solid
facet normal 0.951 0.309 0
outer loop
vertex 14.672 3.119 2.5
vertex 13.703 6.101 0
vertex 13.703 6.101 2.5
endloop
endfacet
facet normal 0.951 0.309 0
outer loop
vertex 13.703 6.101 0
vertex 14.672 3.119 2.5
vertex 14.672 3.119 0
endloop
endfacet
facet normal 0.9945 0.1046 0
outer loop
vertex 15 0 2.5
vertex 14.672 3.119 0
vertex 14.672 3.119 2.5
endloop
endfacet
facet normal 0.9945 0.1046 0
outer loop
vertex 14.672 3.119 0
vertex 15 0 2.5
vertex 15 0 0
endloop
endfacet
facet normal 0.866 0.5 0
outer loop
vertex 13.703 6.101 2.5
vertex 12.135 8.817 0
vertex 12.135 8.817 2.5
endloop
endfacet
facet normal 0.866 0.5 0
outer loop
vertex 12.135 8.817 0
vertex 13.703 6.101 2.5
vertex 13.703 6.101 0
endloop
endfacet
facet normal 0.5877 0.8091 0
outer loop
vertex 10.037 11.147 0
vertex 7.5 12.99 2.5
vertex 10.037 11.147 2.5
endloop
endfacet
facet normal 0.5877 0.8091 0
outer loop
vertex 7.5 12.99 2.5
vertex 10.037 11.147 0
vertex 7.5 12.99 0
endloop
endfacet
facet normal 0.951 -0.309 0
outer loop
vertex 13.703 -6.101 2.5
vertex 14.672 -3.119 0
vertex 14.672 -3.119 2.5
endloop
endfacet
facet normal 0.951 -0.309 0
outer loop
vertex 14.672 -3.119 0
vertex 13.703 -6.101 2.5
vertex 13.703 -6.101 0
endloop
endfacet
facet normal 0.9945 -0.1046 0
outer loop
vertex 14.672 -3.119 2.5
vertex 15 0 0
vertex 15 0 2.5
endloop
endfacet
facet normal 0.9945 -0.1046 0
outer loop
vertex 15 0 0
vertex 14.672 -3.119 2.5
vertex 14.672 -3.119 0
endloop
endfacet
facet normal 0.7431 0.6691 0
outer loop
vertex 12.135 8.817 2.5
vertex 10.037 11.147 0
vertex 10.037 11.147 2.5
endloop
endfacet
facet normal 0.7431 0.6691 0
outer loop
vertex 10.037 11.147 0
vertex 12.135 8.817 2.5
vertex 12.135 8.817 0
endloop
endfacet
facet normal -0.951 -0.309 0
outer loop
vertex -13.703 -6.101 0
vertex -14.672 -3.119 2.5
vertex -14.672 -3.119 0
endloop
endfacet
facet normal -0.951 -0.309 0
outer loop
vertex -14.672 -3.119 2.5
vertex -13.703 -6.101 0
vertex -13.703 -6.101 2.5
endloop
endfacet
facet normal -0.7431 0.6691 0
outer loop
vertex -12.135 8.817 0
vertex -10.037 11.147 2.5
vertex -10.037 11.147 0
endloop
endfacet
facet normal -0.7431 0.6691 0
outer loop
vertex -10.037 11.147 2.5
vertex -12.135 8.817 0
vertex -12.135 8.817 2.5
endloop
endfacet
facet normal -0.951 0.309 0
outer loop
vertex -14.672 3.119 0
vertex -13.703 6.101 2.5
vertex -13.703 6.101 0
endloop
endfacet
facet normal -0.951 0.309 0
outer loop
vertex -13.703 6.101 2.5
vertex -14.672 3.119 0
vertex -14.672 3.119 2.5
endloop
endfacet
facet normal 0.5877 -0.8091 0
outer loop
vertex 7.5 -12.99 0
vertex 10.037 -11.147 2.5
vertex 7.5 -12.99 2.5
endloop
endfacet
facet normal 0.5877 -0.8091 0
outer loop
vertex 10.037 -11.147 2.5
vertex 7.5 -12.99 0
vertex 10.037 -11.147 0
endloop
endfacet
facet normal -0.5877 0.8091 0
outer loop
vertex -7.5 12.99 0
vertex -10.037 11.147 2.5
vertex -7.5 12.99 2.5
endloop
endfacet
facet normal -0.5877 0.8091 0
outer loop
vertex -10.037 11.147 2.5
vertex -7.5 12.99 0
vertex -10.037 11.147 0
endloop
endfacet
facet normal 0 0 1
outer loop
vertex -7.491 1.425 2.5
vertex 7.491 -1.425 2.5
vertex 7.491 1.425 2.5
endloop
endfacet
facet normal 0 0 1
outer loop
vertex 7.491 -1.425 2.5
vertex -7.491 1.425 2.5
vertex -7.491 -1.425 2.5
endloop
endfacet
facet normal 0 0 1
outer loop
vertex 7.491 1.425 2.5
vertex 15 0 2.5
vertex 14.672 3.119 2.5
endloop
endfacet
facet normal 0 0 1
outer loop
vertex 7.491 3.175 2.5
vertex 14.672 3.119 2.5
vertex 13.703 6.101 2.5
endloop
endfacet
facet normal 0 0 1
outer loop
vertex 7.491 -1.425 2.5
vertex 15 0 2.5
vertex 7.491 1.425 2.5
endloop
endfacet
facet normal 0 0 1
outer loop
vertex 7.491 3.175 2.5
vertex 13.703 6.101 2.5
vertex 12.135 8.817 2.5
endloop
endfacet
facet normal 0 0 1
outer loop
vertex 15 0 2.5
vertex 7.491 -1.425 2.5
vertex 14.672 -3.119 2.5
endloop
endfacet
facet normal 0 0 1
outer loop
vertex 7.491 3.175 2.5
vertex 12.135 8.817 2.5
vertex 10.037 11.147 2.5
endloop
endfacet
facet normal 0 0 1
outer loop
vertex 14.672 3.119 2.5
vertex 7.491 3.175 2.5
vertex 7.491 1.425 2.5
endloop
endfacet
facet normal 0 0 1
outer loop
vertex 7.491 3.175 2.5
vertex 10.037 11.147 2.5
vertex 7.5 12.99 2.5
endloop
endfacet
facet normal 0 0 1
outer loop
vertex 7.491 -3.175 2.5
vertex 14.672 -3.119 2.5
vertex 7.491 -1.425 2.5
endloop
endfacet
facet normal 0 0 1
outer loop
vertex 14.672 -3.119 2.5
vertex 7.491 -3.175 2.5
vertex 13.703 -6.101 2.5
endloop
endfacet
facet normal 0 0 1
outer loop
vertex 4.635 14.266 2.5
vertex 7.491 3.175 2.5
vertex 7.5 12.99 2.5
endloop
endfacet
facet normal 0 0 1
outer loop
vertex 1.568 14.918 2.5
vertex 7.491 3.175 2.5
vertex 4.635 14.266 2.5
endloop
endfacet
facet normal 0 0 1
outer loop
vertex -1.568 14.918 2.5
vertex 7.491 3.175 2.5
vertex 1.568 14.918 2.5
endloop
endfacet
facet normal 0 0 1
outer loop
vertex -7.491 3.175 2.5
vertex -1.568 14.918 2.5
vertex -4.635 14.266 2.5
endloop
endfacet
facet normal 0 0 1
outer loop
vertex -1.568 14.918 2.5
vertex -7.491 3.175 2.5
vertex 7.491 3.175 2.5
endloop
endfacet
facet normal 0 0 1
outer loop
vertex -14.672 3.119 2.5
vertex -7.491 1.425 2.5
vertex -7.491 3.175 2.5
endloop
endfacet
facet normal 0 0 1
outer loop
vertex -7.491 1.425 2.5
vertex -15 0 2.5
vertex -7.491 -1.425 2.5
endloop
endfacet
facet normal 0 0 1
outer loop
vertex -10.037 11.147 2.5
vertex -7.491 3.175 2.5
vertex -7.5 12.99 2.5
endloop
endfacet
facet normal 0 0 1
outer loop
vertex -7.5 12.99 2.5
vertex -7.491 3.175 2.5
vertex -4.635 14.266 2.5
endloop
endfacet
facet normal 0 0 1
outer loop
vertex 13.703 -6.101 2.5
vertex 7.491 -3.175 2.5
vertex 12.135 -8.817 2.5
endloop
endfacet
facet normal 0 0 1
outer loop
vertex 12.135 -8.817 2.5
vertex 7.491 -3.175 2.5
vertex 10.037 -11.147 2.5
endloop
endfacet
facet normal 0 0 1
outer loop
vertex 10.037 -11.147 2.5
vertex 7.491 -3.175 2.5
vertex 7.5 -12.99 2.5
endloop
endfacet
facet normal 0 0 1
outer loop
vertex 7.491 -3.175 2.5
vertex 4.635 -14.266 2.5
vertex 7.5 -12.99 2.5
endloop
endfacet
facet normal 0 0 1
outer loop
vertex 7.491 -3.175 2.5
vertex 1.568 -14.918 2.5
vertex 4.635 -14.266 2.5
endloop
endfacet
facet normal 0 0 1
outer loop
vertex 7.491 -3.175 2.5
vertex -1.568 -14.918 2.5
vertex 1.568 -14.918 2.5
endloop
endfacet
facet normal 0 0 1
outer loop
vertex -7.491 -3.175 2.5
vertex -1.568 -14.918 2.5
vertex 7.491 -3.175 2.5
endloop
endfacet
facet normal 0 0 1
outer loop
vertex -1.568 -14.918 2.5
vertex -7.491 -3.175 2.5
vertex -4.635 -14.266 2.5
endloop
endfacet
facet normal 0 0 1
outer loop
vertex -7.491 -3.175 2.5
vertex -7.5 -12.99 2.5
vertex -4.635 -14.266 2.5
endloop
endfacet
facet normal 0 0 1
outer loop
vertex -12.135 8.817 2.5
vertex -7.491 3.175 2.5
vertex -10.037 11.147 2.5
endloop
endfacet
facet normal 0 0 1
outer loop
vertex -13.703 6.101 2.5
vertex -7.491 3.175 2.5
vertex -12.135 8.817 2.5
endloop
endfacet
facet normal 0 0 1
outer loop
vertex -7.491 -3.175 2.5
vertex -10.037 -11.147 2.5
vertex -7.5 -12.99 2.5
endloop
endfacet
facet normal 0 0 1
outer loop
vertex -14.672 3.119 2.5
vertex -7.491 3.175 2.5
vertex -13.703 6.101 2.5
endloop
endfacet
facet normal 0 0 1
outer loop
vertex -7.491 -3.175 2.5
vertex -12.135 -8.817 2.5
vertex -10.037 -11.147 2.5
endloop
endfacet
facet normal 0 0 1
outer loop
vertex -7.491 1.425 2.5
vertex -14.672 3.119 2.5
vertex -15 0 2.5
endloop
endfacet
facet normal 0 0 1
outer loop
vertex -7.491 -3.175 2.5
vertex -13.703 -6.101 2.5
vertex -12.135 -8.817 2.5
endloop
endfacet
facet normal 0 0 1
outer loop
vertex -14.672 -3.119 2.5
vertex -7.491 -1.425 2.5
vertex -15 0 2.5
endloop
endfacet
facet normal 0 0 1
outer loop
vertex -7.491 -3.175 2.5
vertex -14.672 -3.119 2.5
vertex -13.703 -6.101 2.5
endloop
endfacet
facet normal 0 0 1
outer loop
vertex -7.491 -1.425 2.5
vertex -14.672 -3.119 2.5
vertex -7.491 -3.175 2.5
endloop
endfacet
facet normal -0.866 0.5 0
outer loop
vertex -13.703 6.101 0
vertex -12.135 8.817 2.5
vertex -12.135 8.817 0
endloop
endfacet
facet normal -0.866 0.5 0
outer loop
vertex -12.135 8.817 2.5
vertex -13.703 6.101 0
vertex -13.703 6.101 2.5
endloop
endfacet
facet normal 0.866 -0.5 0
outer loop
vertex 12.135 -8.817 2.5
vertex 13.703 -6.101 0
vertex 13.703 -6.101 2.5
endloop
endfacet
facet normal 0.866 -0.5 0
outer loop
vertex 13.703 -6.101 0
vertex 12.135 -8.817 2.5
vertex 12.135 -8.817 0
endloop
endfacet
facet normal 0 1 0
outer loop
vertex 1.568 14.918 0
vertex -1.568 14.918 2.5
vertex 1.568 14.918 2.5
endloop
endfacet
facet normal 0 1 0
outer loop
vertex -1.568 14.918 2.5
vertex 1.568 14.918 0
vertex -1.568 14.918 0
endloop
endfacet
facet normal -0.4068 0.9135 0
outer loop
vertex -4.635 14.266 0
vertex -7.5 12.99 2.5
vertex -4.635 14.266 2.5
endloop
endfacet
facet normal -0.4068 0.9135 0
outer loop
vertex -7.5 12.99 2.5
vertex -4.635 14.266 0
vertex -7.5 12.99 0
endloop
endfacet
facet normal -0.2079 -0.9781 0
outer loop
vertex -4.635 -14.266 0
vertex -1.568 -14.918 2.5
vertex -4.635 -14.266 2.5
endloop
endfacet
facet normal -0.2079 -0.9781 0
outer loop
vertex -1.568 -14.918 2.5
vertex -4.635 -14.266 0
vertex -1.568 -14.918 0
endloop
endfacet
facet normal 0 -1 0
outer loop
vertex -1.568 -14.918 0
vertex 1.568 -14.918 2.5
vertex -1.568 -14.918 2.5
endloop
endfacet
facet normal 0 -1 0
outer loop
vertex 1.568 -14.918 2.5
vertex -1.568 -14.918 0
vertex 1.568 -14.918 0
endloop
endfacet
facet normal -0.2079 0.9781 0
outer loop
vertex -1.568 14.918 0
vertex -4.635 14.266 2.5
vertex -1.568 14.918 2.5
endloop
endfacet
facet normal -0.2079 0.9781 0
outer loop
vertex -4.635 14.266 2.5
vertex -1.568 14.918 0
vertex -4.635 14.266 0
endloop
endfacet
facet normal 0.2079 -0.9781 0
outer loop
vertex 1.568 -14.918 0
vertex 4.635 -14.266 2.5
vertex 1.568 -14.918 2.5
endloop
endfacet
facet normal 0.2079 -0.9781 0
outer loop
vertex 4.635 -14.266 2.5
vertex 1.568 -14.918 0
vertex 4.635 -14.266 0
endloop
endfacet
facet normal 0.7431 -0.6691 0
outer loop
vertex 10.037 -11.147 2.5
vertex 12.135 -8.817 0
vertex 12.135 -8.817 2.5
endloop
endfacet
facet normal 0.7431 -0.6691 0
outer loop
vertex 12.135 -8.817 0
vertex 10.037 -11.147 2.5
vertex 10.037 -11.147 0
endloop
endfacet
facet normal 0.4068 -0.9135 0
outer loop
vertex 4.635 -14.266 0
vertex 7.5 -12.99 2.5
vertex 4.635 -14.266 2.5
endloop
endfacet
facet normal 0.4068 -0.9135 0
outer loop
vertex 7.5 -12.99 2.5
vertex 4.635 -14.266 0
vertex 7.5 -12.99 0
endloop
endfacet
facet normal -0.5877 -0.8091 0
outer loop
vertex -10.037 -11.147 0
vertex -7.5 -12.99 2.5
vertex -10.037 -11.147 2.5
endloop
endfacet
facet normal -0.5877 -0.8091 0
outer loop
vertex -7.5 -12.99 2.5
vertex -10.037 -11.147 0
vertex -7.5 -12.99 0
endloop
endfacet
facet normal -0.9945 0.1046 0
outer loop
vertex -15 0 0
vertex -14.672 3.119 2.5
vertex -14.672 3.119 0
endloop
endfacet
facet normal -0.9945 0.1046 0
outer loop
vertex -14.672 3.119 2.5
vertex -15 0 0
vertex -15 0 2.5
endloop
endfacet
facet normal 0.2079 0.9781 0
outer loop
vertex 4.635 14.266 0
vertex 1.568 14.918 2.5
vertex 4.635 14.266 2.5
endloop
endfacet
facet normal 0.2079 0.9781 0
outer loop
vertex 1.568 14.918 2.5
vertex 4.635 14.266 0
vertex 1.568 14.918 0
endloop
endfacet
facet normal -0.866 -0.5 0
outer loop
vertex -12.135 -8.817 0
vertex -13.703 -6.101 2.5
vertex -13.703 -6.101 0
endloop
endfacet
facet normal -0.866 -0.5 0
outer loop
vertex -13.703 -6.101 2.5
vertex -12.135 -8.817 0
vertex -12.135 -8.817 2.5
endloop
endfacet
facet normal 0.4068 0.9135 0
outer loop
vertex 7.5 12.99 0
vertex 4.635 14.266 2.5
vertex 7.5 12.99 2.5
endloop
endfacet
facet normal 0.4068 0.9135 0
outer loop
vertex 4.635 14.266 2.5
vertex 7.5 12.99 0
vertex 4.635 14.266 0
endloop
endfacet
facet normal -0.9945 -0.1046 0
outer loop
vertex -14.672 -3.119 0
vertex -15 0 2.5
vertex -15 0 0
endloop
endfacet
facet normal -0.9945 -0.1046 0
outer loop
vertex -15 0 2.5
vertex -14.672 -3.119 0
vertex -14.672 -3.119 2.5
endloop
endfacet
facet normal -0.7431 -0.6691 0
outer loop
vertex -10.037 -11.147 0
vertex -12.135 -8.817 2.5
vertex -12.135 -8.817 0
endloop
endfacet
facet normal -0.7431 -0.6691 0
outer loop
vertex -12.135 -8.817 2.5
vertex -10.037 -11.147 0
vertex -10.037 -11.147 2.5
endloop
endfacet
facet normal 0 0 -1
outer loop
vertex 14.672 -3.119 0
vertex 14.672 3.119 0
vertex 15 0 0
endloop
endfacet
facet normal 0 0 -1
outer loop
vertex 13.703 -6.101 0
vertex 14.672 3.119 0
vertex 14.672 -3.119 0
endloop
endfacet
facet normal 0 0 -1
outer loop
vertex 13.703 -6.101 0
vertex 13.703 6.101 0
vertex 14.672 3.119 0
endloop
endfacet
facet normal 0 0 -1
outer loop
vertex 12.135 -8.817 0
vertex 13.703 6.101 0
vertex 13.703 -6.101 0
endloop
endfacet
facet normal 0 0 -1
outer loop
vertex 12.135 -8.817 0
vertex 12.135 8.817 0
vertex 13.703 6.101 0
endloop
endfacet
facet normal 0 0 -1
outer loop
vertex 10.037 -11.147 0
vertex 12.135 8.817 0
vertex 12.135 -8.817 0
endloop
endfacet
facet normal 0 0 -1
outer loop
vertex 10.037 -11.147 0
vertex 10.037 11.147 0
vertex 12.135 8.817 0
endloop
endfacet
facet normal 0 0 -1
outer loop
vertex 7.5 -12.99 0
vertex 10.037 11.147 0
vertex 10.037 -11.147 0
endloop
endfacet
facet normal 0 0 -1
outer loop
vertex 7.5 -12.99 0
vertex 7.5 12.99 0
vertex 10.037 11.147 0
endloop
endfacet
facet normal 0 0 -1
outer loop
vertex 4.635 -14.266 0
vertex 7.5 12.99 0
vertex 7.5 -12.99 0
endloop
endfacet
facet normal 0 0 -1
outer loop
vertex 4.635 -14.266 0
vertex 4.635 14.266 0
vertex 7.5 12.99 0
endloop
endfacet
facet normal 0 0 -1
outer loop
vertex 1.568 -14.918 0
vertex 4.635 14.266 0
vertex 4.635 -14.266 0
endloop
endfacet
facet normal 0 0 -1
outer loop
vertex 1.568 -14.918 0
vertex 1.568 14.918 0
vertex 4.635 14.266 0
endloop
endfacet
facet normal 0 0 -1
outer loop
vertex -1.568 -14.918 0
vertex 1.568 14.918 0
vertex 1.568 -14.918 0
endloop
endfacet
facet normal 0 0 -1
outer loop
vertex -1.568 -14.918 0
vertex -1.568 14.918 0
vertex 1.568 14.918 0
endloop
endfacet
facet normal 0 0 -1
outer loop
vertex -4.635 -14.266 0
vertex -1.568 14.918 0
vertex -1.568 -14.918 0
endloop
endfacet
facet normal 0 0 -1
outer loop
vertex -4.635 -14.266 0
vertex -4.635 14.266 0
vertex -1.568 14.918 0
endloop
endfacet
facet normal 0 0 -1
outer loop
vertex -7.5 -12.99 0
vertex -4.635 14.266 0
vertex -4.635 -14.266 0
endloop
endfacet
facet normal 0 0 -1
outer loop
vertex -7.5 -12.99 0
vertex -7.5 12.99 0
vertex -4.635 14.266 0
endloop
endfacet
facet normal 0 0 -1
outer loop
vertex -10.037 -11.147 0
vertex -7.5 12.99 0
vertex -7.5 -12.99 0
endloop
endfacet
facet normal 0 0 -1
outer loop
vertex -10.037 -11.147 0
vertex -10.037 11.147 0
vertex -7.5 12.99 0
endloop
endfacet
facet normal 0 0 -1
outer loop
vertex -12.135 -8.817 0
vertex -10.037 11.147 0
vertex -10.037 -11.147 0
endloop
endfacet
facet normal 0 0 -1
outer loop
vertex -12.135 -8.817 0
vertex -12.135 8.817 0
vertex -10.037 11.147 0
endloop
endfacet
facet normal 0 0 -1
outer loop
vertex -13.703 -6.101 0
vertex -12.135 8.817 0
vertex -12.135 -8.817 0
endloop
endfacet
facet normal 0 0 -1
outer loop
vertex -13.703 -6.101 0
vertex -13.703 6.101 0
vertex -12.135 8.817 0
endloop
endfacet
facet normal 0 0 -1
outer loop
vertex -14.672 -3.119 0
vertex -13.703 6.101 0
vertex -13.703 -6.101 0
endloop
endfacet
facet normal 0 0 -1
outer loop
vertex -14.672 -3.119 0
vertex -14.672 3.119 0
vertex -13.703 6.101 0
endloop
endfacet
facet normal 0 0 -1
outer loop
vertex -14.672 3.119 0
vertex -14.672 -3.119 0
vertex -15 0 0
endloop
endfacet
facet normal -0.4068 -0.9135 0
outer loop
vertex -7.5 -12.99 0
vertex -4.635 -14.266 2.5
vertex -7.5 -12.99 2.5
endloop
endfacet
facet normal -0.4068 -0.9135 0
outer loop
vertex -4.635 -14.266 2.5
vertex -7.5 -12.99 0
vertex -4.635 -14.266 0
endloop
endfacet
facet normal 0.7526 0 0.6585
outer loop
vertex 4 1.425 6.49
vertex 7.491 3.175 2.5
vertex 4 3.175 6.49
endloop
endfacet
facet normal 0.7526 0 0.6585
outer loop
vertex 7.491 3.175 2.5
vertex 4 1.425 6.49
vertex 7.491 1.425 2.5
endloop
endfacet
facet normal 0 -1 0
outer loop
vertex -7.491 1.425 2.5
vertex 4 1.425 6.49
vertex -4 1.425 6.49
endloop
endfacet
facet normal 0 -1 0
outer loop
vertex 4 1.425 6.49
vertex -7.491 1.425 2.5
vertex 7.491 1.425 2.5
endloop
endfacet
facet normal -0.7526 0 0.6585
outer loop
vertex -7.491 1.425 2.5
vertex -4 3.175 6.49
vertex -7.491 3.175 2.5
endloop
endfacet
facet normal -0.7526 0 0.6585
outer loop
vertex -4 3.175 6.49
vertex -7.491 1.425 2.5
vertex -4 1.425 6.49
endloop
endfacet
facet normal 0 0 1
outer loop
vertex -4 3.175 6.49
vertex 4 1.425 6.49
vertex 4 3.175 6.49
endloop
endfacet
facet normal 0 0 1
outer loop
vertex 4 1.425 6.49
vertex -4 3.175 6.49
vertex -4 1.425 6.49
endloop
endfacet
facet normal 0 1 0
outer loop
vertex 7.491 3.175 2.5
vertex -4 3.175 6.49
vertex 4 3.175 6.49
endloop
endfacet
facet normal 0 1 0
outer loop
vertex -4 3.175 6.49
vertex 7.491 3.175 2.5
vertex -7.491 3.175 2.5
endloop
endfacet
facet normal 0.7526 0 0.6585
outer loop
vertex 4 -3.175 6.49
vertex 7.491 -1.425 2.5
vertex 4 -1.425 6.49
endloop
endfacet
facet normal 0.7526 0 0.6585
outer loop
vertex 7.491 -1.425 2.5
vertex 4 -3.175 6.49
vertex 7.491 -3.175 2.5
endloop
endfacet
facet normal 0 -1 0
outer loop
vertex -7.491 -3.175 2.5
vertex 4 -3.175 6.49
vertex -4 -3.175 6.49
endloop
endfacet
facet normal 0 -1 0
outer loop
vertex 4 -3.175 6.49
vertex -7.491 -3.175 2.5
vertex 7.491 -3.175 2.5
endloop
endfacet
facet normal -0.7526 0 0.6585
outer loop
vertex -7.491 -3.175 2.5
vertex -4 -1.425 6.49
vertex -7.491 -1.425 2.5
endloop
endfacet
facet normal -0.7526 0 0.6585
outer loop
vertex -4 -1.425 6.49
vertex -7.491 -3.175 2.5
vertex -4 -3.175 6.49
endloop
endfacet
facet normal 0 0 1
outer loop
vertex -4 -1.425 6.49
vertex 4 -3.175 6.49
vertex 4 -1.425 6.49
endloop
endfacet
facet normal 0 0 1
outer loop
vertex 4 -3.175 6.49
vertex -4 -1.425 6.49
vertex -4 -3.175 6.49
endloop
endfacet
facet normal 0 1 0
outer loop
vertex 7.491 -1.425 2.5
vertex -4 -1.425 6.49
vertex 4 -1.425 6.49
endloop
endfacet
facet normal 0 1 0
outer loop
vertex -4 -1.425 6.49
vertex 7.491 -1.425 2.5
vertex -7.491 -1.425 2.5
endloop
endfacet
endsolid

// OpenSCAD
baseDiameter = 30;
baseThickness = 2.5;
holderThickness = 1.75;
holderHeight = 4;
holderSpacing = 2.85;
holderWidth = 15;
holderWidth2 = 8;

cylinder(d=baseDiameter,h=baseThickness);
module holder() {
    translate([0,holderThickness/2,baseThickness-0.01])
    rotate([90,0,0])
    linear_extrude(height=holderThickness)
    polygon([[-holderWidth/2,0],[holderWidth/2,0],[holderWidth2/2,  holderHeight],[-holderWidth2/2,holderHeight]]);
}

translate([0,holderThickness/2+holderSpacing/2,0])
holder();
translate([0,-holderThickness/2-holderSpacing/2,0])
holder();
